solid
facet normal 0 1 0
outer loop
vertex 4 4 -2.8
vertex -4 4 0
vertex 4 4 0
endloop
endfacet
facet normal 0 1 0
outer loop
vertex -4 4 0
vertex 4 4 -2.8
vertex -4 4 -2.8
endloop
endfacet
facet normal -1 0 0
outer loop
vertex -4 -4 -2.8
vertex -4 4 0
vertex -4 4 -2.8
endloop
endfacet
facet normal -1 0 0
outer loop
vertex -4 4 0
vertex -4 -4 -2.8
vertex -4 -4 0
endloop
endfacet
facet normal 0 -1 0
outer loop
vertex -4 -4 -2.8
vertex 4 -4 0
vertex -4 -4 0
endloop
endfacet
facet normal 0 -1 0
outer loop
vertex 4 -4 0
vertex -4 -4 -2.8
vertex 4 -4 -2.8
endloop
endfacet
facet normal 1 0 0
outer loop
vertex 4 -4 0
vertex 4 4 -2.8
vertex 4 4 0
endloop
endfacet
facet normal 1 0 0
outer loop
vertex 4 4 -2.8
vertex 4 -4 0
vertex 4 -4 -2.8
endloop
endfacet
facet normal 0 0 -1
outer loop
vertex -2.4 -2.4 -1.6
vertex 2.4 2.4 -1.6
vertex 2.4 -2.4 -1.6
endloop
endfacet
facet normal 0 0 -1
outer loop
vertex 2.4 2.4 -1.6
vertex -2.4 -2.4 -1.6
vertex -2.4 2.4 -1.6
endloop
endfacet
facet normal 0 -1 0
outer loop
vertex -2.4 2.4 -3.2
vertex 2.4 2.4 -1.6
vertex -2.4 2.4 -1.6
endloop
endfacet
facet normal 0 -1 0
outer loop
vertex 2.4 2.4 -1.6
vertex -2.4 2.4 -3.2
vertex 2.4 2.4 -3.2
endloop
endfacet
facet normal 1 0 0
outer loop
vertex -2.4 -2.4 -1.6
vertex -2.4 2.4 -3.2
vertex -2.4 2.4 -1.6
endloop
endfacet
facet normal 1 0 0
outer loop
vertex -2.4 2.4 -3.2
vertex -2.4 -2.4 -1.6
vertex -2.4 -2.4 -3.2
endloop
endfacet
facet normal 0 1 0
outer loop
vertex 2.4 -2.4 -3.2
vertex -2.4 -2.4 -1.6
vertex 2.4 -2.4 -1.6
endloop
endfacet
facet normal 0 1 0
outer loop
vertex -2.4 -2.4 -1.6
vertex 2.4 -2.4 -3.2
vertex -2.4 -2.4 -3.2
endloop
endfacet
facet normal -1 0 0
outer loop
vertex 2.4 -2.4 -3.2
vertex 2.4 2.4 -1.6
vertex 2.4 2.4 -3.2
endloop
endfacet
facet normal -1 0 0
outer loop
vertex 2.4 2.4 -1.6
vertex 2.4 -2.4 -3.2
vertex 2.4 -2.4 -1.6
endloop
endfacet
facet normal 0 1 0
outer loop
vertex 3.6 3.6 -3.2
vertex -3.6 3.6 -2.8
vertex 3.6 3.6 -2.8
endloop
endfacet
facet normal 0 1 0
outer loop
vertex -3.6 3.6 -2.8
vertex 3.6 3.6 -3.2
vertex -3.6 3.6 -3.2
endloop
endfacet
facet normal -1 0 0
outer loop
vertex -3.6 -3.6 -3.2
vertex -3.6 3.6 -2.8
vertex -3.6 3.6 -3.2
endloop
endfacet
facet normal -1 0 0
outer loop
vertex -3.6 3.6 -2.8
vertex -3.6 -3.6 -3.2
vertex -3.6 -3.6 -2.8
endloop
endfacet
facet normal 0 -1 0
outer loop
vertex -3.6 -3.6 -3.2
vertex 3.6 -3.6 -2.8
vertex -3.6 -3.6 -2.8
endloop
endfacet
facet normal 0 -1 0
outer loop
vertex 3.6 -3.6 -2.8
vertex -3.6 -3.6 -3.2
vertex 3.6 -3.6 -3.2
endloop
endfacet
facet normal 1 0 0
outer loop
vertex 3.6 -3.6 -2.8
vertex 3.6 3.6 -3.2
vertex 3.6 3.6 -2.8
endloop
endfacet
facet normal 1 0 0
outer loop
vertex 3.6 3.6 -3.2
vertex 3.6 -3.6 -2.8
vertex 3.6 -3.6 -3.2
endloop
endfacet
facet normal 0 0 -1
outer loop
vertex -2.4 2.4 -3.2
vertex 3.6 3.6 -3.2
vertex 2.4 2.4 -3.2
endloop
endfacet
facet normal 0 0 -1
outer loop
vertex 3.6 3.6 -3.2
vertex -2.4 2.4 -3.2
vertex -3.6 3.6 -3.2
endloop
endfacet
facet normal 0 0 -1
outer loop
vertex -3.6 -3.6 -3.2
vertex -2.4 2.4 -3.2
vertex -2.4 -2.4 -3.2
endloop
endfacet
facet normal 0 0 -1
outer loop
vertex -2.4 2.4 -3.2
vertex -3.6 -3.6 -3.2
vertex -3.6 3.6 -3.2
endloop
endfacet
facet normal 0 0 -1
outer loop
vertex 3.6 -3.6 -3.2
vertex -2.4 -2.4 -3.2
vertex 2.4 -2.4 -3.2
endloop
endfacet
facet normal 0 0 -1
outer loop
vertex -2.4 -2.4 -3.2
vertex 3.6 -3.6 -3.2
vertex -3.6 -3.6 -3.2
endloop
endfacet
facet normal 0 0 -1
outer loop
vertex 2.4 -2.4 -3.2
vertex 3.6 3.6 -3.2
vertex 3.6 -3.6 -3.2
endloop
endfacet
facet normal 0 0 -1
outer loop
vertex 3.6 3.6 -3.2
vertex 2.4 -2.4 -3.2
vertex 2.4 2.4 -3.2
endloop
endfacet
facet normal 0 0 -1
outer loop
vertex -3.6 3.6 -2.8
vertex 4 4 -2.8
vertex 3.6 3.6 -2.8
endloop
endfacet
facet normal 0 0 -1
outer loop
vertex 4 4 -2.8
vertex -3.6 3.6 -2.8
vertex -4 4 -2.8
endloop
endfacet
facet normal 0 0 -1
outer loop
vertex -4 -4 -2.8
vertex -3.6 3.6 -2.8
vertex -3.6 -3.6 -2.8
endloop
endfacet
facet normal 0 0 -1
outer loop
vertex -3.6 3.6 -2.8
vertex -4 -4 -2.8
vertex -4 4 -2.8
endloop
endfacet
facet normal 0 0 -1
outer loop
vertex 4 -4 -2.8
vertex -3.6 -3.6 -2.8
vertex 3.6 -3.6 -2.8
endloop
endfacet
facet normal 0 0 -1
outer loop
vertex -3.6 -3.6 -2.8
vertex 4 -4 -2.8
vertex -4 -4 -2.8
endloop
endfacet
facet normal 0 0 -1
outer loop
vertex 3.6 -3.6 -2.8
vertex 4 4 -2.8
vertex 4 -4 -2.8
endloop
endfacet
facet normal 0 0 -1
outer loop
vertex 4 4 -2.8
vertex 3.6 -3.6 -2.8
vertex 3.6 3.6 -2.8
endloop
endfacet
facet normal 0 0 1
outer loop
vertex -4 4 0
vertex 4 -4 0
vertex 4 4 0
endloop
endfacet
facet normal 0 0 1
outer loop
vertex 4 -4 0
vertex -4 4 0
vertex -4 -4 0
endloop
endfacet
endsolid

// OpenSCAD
// file: ../p/box5.scad
use <../lib.scad>
function ldraw_lib__box5() = [
// 0 Box with 5 Faces and All Edges
// 0 Name: box5.dat
// 0 Author: James Jessiman
// 0 !LDRAW_ORG Primitive UPDATE 2012-01
// 0 !LICENSE Licensed under CC BY 4.0 : see CAreadme.txt
// 
// 0 BFC CERTIFY CCW
  [0,"BFC","CERTIFY"],
  [0,"BFC","CCW"],
// 
// 0 !HISTORY 2002-04-03 [sbliss] Modified for BFC compliance
// 0 !HISTORY 2002-04-25 [PTadmin] Official Update 2002-02
// 0 !HISTORY 2007-06-24 [PTadmin] Header formatted for Contributor Agreement
// 0 !HISTORY 2008-07-01 [PTadmin] Official Update 2008-01
// 0 !HISTORY 2012-02-16 [Philo] Changed to CCW
// 0 !HISTORY 2012-03-30 [PTadmin] Official Update 2012-01
// 
// 
// 2 24 1 1 1 -1 1 1
  [2,24,1,1,1,-1,1,1],
// 2 24 -1 1 1 -1 1 -1
  [2,24,-1,1,1,-1,1,-1],
// 2 24 -1 1 -1 1 1 -1
  [2,24,-1,1,-1,1,1,-1],
// 2 24 1 1 -1 1 1 1
  [2,24,1,1,-1,1,1,1],
// 2 24 1 0 1 -1 0 1
  [2,24,1,0,1,-1,0,1],
// 2 24 -1 0 1 -1 0 -1
  [2,24,-1,0,1,-1,0,-1],
// 2 24 -1 0 -1 1 0 -1
  [2,24,-1,0,-1,1,0,-1],
// 2 24 1 0 -1 1 0 1
  [2,24,1,0,-1,1,0,1],
// 2 24 1 0 1 1 1 1
  [2,24,1,0,1,1,1,1],
// 2 24 -1 0 1 -1 1 1
  [2,24,-1,0,1,-1,1,1],
// 2 24 1 0 -1 1 1 -1
  [2,24,1,0,-1,1,1,-1],
// 2 24 -1 0 -1 -1 1 -1
  [2,24,-1,0,-1,-1,1,-1],
// 4 16 -1 1 1 1 1 1 1 1 -1 -1 1 -1
  [4,16,-1,1,1,1,1,1,1,1,-1,-1,1,-1],
// 4 16 -1 1 1 -1 0 1 1 0 1 1 1 1
  [4,16,-1,1,1,-1,0,1,1,0,1,1,1,1],
// 4 16 -1 1 -1 -1 0 -1 -1 0 1 -1 1 1
  [4,16,-1,1,-1,-1,0,-1,-1,0,1,-1,1,1],
// 4 16 1 1 -1 1 0 -1 -1 0 -1 -1 1 -1
  [4,16,1,1,-1,1,0,-1,-1,0,-1,-1,1,-1],
// 4 16 1 1 1 1 0 1 1 0 -1 1 1 -1
  [4,16,1,1,1,1,0,1,1,0,-1,1,1,-1],
];
module ldraw_lib__box5(step=0, col=false, unit=2/5, alt=false, line=0.2, solid=!$preview)
    makepoly(ldraw_lib__box5(), step=step, col=col, unit=unit, alt=alt, line=line, solid=solid);
ldraw_lib__box5(line=0.2);
// file: ../p/box4.scad
use <../lib.scad>
function ldraw_lib__box4() = [
// 0 Box with 4 Faces (2 Parallel Pairs) and All Edges
// 0 Name: box4.dat
// 0 Author: James Jessiman
// 0 !LDRAW_ORG Primitive UPDATE 2012-01
// 0 !LICENSE Licensed under CC BY 4.0 : see CAreadme.txt
// 
// 0 BFC CERTIFY CCW
  [0,"BFC","CERTIFY"],
  [0,"BFC","CCW"],
// 
// 0 !HISTORY 2002-04-03 [sbliss] Modified for BFC compliance
// 0 !HISTORY 2002-04-25 [PTadmin] Official Update 2002-02
// 0 !HISTORY 2007-06-24 [PTadmin] Header formatted for Contributor Agreement
// 0 !HISTORY 2008-07-01 [PTadmin] Official Update 2008-01
// 0 !HISTORY 2012-02-16 [Philo] Changed to CCW
// 0 !HISTORY 2012-03-30 [PTadmin] Official Update 2012-01
// 
// 
// 2 24 1 1 1 -1 1 1
  [2,24,1,1,1,-1,1,1],
// 2 24 -1 1 1 -1 1 -1
  [2,24,-1,1,1,-1,1,-1],
// 2 24 -1 1 -1 1 1 -1
  [2,24,-1,1,-1,1,1,-1],
// 2 24 1 1 -1 1 1 1
  [2,24,1,1,-1,1,1,1],
// 2 24 1 0 1 -1 0 1
  [2,24,1,0,1,-1,0,1],
// 2 24 -1 0 1 -1 0 -1
  [2,24,-1,0,1,-1,0,-1],
// 2 24 -1 0 -1 1 0 -1
  [2,24,-1,0,-1,1,0,-1],
// 2 24 1 0 -1 1 0 1
  [2,24,1,0,-1,1,0,1],
// 2 24 1 0 1 1 1 1
  [2,24,1,0,1,1,1,1],
// 2 24 -1 0 1 -1 1 1
  [2,24,-1,0,1,-1,1,1],
// 2 24 1 0 -1 1 1 -1
  [2,24,1,0,-1,1,1,-1],
// 2 24 -1 0 -1 -1 1 -1
  [2,24,-1,0,-1,-1,1,-1],
// 4 16 -1 1 1 -1 0 1 1 0 1 1 1 1
  [4,16,-1,1,1,-1,0,1,1,0,1,1,1,1],
// 4 16 -1 1 -1 -1 0 -1 -1 0 1 -1 1 1
  [4,16,-1,1,-1,-1,0,-1,-1,0,1,-1,1,1],
// 4 16 1 1 -1 1 0 -1 -1 0 -1 -1 1 -1
  [4,16,1,1,-1,1,0,-1,-1,0,-1,-1,1,-1],
// 4 16 1 1 1 1 0 1 1 0 -1 1 1 -1
  [4,16,1,1,1,1,0,1,1,0,-1,1,1,-1],
];
module ldraw_lib__box4(step=0, col=false, unit=2/5, alt=false, line=0.2, solid=!$preview)
    makepoly(ldraw_lib__box4(), step=step, col=col, unit=unit, alt=alt, line=line, solid=solid);
ldraw_lib__box4(line=0.2);
// file: s/3070bs01.scad
use <../../lib.scad>
use <../../p/box4.scad>
use <../../p/box5.scad>
function ldraw_lib__s__3070bs01() = [
// 0 ~Tile  1 x  1 with Groove without Top Face
// 0 Name: s\3070bs01.dat
// 0 Author: Chris Dee [cwdee]
// 0 !LDRAW_ORG Subpart UPDATE 2009-02
// 0 !LICENSE Licensed under CC BY 4.0 : see CAreadme.txt
// 
// 0 BFC CERTIFY CCW
  [0,"BFC","CERTIFY"],
  [0,"BFC","CCW"],
// 
// 0 !HISTORY 2009-09-03 [PTadmin] Official Update 2009-02
// 
// 
// 1 16 0 0 0 10 0 0 0 7 0 0 0 10 box4.dat
  [1,16,0,0,0,10,0,0,0,7,0,0,0,10, ldraw_lib__box4()],
// 0 BFC INVERTNEXT
  [0,"BFC","INVERTNEXT"],
// 1 16 0 8 0 6 0 0 0 -4 0 0 0 6 box5.dat
  [1,16,0,8,0,6,0,0,0,-4,0,0,0,6, ldraw_lib__box5()],
// 1 16 0 7 0 9 0 0 0 1 0 0 0 9 box4.dat
  [1,16,0,7,0,9,0,0,0,1,0,0,0,9, ldraw_lib__box4()],
// 
// 4 16 9 8 9 6 8 6 -6 8 6 -9 8 9
  [4,16,9,8,9,6,8,6,-6,8,6,-9,8,9],
// 4 16 -9 8 9 -6 8 6 -6 8 -6 -9 8 -9
  [4,16,-9,8,9,-6,8,6,-6,8,-6,-9,8,-9],
// 4 16 -9 8 -9 -6 8 -6 6 8 -6 9 8 -9
  [4,16,-9,8,-9,-6,8,-6,6,8,-6,9,8,-9],
// 4 16 9 8 -9 6 8 -6 6 8 6 9 8 9
  [4,16,9,8,-9,6,8,-6,6,8,6,9,8,9],
// 
// 4 16 10 7 10 9 7 9 -9 7 9 -10 7 10
  [4,16,10,7,10,9,7,9,-9,7,9,-10,7,10],
// 4 16 -10 7 10 -9 7 9 -9 7 -9 -10 7 -10
  [4,16,-10,7,10,-9,7,9,-9,7,-9,-10,7,-10],
// 4 16 -10 7 -10 -9 7 -9 9 7 -9 10 7 -10
  [4,16,-10,7,-10,-9,7,-9,9,7,-9,10,7,-10],
// 4 16 10 7 -10 9 7 -9 9 7 9 10 7 10
  [4,16,10,7,-10,9,7,-9,9,7,9,10,7,10],
// 0
];
module ldraw_lib__s__3070bs01(step=0, col=false, unit=2/5, alt=false, line=0.2, solid=!$preview)
    makepoly(ldraw_lib__s__3070bs01(), step=step, col=col, unit=unit, alt=alt, line=line, solid=solid);
ldraw_lib__s__3070bs01(line=0.2);
// file: 3070b.scad
use <../lib.scad>
use <s/3070bs01.scad>
function ldraw_lib__3070b() = [
// 0 Tile  1 x  1 with Groove
// 0 Name: 3070b.dat
// 0 Author: Chris Dee [cwdee]
// 0 !LDRAW_ORG Part UPDATE 2009-02
// 0 !LICENSE Licensed under CC BY 4.0 : see CAreadme.txt
// 
// 0 BFC CERTIFY CW
  [0,"BFC","CERTIFY"],
  [0,"BFC","CW"],
// 
// 0 !HISTORY 2009-09-03 [PTadmin] Official Update 2009-02
// 
// 
// 1 16 0 0 0 1 0 0 0 1 0 0 0 1 s\3070bs01.dat
  [1,16,0,0,0,1,0,0,0,1,0,0,0,1, ldraw_lib__s__3070bs01()],
// 4 16 10 0 10 10 0 -10 -10 0 -10 -10 0 10
  [4,16,10,0,10,10,0,-10,-10,0,-10,-10,0,10],
// 0
];
module ldraw_lib__3070b(step=0, col=false, unit=2/5, alt=false, line=0.2, solid=!$preview)
    makepoly(ldraw_lib__3070b(), step=step, col=col, unit=unit, alt=alt, line=line, solid=solid);
ldraw_lib__3070b(line=0.2);
// main file
use <../lib.scad>
use <3070b.scad>
function ldraw_lib__3003941() = [
// 0 ~_Tile  1 x  1 with Groove Trans Red (Obsolete)
// 0 Name: 3003941.dat
// 0 Author: [PTadmin]
// 0 !LDRAW_ORG Part Physical_Colour UPDATE 2019-02
// 0 !LICENSE Licensed under CC BY 4.0 : see CAreadme.txt
// 
// 0 BFC CERTIFY CCW
  [0,"BFC","CERTIFY"],
  [0,"BFC","CCW"],
// 
// 0 !HISTORY 2010-12-31 [PTadmin] Official Update 2010-03
// 0 !HISTORY 2019-07-19 [Holly-Wood] Obsoleted per decision not to include physical colour parts
// 0 !HISTORY 2019-09-09 [PTadmin] Official Update 2019-02
// 
// 
// 0 // This file is a "shortcut" with the correct number for the actual
// 0 // colouring of the part (Trans Red).
// 
// 1 36 0 0 0 1 0 0 0 1 0 0 0 1 3070b.dat
  [1,36,0,0,0,1,0,0,0,1,0,0,0,1, ldraw_lib__3070b()],
];
module ldraw_lib__3003941(step=0, col=false, unit=2/5, alt=false, line=0.2, solid=!$preview)
    makepoly(ldraw_lib__3003941(), step=step, col=col, unit=unit, alt=alt, line=line, solid=solid);
ldraw_lib__3003941(line=0.2);
